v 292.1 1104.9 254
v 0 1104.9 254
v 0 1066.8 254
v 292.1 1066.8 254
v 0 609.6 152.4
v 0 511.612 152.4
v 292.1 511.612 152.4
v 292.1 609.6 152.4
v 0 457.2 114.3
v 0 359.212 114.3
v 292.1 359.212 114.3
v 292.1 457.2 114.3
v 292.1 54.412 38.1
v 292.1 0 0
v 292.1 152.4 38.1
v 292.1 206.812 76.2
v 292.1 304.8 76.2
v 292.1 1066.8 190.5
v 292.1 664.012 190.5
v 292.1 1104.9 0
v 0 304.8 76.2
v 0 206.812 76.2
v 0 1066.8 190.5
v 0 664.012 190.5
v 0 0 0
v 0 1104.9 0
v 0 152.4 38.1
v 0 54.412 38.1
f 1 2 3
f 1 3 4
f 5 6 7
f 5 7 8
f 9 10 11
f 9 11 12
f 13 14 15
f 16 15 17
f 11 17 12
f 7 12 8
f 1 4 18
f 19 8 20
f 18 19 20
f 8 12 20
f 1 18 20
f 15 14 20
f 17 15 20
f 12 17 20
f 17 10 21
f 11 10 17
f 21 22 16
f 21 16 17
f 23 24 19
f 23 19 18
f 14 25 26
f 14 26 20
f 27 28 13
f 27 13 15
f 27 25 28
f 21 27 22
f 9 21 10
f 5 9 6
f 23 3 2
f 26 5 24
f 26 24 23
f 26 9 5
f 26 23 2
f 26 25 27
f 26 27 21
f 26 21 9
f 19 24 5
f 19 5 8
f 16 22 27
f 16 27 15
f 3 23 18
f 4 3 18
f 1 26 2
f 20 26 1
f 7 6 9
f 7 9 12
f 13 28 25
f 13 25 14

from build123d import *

# Parameters (mm, degrees)
F0_W        = 1066.8
F0_H        = 38.1
F1_DEPTH    = 292.1
F2_W        = 914.4
F2_H        = 38.1
F3_DEPTH    = 292.1
F4_W        = 762
F4_H        = 38.1
F5_DEPTH    = 292.1
F6_W        = 609.6
F6_H        = 38.1
F7_DEPTH    = 292.1
F8_W        = 457.2
F8_H        = 38.1
F9_DEPTH    = 292.1
F10_SIZE2   = 54.412429
F10_SIZE    = 38.09999
F10_2_SIZE2 = 54.412429
F10_2_SIZE  = 38.09999
F10_3_SIZE2 = 54.412429
F10_3_SIZE  = 38.09999
F10_4_SIZE2 = 54.412429
F10_4_SIZE  = 38.09999
F10_5_SIZE2 = 54.412429
F10_5_SIZE  = 38.09999
F11_W       = 292.1000000001
F11_H       = 38.1
F12_DEPTH   = 254


# Not quite as in the source:
# - a fillet or chamfer is up to 0.001 mm smaller than in the source, because OpenCascade refuses the exact size


with BuildPart() as f1:
    # F0 (on Right) → F1 (new body)
    with BuildSketch(Plane.YZ):
        with Locations((533.4, 19.05)):
            Rectangle(F0_W, F0_H)
    extrude(amount=F1_DEPTH)

    # F2 (on Right) → F3 (join, through all)
    with BuildSketch(Plane.YZ):
        with Locations((609.6, 57.15)):
            Rectangle(F2_W, F2_H)
    extrude(amount=F3_DEPTH)

    # F4 (on Right) → F5 (join, through all)
    with BuildSketch(Plane.YZ):
        with Locations((685.8, 95.25)):
            Rectangle(F4_W, F4_H)
    extrude(amount=F5_DEPTH)

    # F6 (on Right) → F7 (join, through all)
    with BuildSketch(Plane.YZ):
        with Locations((762, 133.35)):
            Rectangle(F6_W, F6_H)
    extrude(amount=F7_DEPTH)

    # F8 (on Right) → F9 (join, through all)
    with BuildSketch(Plane.YZ):
        with Locations((838.2, 171.45)):
            Rectangle(F8_W, F8_H)
    extrude(amount=F9_DEPTH)

    # F10 (size 38.1 and 54.4124390569 in the source; OpenCascade refuses exactly that, so slightly less here)
    f10_edges = [f1.edges().sort_by_distance(p)[0] for p in [
        (146.05, 0, 38.1),
    ]]
    f10_side = f1.faces().sort_by_distance((146.05, 0, 19.05))[0]
    chamfer(f10_edges, length=F10_SIZE, length2=F10_SIZE2, reference=f10_side)

    # F10#2 (size 38.1 and 54.4124390569 in the source; OpenCascade refuses exactly that, so slightly less here)
    f10_2_edges = [f1.edges().sort_by_distance(p)[0] for p in [
        (146.05, 152.4, 76.2),
    ]]
    f10_2_side = f1.faces().sort_by_distance((146.05, 152.4, 57.15))[0]
    chamfer(f10_2_edges, length=F10_2_SIZE, length2=F10_2_SIZE2, reference=f10_2_side)

    # F10#3 (size 38.1 and 54.4124390569 in the source; OpenCascade refuses exactly that, so slightly less here)
    f10_3_edges = [f1.edges().sort_by_distance(p)[0] for p in [
        (146.05, 304.8, 114.3),
    ]]
    f10_3_side = f1.faces().sort_by_distance((146.05, 304.8, 95.25))[0]
    chamfer(f10_3_edges, length=F10_3_SIZE, length2=F10_3_SIZE2, reference=f10_3_side)

    # F10#4 (size 38.1 and 54.4124390569 in the source; OpenCascade refuses exactly that, so slightly less here)
    f10_4_edges = [f1.edges().sort_by_distance(p)[0] for p in [
        (146.05, 457.2, 152.4),
    ]]
    f10_4_side = f1.faces().sort_by_distance((146.05, 457.2, 133.35))[0]
    chamfer(f10_4_edges, length=F10_4_SIZE, length2=F10_4_SIZE2, reference=f10_4_side)

    # F10#5 (size 38.1 and 54.4124390569 in the source; OpenCascade refuses exactly that, so slightly less here)
    f10_5_edges = [f1.edges().sort_by_distance(p)[0] for p in [
        (146.05, 609.6, 190.5),
    ]]
    f10_5_side = f1.faces().sort_by_distance((146.05, 609.6, 171.45))[0]
    chamfer(f10_5_edges, length=F10_5_SIZE, length2=F10_5_SIZE2, reference=f10_5_side)

    # F11 (on Top) → F12 (join)
    with BuildSketch(Plane.XY):
        with Locations((146.0500000001, 1085.85)):
            Rectangle(F11_W, F11_H)
    extrude(amount=F12_DEPTH)


solid = f1.part
